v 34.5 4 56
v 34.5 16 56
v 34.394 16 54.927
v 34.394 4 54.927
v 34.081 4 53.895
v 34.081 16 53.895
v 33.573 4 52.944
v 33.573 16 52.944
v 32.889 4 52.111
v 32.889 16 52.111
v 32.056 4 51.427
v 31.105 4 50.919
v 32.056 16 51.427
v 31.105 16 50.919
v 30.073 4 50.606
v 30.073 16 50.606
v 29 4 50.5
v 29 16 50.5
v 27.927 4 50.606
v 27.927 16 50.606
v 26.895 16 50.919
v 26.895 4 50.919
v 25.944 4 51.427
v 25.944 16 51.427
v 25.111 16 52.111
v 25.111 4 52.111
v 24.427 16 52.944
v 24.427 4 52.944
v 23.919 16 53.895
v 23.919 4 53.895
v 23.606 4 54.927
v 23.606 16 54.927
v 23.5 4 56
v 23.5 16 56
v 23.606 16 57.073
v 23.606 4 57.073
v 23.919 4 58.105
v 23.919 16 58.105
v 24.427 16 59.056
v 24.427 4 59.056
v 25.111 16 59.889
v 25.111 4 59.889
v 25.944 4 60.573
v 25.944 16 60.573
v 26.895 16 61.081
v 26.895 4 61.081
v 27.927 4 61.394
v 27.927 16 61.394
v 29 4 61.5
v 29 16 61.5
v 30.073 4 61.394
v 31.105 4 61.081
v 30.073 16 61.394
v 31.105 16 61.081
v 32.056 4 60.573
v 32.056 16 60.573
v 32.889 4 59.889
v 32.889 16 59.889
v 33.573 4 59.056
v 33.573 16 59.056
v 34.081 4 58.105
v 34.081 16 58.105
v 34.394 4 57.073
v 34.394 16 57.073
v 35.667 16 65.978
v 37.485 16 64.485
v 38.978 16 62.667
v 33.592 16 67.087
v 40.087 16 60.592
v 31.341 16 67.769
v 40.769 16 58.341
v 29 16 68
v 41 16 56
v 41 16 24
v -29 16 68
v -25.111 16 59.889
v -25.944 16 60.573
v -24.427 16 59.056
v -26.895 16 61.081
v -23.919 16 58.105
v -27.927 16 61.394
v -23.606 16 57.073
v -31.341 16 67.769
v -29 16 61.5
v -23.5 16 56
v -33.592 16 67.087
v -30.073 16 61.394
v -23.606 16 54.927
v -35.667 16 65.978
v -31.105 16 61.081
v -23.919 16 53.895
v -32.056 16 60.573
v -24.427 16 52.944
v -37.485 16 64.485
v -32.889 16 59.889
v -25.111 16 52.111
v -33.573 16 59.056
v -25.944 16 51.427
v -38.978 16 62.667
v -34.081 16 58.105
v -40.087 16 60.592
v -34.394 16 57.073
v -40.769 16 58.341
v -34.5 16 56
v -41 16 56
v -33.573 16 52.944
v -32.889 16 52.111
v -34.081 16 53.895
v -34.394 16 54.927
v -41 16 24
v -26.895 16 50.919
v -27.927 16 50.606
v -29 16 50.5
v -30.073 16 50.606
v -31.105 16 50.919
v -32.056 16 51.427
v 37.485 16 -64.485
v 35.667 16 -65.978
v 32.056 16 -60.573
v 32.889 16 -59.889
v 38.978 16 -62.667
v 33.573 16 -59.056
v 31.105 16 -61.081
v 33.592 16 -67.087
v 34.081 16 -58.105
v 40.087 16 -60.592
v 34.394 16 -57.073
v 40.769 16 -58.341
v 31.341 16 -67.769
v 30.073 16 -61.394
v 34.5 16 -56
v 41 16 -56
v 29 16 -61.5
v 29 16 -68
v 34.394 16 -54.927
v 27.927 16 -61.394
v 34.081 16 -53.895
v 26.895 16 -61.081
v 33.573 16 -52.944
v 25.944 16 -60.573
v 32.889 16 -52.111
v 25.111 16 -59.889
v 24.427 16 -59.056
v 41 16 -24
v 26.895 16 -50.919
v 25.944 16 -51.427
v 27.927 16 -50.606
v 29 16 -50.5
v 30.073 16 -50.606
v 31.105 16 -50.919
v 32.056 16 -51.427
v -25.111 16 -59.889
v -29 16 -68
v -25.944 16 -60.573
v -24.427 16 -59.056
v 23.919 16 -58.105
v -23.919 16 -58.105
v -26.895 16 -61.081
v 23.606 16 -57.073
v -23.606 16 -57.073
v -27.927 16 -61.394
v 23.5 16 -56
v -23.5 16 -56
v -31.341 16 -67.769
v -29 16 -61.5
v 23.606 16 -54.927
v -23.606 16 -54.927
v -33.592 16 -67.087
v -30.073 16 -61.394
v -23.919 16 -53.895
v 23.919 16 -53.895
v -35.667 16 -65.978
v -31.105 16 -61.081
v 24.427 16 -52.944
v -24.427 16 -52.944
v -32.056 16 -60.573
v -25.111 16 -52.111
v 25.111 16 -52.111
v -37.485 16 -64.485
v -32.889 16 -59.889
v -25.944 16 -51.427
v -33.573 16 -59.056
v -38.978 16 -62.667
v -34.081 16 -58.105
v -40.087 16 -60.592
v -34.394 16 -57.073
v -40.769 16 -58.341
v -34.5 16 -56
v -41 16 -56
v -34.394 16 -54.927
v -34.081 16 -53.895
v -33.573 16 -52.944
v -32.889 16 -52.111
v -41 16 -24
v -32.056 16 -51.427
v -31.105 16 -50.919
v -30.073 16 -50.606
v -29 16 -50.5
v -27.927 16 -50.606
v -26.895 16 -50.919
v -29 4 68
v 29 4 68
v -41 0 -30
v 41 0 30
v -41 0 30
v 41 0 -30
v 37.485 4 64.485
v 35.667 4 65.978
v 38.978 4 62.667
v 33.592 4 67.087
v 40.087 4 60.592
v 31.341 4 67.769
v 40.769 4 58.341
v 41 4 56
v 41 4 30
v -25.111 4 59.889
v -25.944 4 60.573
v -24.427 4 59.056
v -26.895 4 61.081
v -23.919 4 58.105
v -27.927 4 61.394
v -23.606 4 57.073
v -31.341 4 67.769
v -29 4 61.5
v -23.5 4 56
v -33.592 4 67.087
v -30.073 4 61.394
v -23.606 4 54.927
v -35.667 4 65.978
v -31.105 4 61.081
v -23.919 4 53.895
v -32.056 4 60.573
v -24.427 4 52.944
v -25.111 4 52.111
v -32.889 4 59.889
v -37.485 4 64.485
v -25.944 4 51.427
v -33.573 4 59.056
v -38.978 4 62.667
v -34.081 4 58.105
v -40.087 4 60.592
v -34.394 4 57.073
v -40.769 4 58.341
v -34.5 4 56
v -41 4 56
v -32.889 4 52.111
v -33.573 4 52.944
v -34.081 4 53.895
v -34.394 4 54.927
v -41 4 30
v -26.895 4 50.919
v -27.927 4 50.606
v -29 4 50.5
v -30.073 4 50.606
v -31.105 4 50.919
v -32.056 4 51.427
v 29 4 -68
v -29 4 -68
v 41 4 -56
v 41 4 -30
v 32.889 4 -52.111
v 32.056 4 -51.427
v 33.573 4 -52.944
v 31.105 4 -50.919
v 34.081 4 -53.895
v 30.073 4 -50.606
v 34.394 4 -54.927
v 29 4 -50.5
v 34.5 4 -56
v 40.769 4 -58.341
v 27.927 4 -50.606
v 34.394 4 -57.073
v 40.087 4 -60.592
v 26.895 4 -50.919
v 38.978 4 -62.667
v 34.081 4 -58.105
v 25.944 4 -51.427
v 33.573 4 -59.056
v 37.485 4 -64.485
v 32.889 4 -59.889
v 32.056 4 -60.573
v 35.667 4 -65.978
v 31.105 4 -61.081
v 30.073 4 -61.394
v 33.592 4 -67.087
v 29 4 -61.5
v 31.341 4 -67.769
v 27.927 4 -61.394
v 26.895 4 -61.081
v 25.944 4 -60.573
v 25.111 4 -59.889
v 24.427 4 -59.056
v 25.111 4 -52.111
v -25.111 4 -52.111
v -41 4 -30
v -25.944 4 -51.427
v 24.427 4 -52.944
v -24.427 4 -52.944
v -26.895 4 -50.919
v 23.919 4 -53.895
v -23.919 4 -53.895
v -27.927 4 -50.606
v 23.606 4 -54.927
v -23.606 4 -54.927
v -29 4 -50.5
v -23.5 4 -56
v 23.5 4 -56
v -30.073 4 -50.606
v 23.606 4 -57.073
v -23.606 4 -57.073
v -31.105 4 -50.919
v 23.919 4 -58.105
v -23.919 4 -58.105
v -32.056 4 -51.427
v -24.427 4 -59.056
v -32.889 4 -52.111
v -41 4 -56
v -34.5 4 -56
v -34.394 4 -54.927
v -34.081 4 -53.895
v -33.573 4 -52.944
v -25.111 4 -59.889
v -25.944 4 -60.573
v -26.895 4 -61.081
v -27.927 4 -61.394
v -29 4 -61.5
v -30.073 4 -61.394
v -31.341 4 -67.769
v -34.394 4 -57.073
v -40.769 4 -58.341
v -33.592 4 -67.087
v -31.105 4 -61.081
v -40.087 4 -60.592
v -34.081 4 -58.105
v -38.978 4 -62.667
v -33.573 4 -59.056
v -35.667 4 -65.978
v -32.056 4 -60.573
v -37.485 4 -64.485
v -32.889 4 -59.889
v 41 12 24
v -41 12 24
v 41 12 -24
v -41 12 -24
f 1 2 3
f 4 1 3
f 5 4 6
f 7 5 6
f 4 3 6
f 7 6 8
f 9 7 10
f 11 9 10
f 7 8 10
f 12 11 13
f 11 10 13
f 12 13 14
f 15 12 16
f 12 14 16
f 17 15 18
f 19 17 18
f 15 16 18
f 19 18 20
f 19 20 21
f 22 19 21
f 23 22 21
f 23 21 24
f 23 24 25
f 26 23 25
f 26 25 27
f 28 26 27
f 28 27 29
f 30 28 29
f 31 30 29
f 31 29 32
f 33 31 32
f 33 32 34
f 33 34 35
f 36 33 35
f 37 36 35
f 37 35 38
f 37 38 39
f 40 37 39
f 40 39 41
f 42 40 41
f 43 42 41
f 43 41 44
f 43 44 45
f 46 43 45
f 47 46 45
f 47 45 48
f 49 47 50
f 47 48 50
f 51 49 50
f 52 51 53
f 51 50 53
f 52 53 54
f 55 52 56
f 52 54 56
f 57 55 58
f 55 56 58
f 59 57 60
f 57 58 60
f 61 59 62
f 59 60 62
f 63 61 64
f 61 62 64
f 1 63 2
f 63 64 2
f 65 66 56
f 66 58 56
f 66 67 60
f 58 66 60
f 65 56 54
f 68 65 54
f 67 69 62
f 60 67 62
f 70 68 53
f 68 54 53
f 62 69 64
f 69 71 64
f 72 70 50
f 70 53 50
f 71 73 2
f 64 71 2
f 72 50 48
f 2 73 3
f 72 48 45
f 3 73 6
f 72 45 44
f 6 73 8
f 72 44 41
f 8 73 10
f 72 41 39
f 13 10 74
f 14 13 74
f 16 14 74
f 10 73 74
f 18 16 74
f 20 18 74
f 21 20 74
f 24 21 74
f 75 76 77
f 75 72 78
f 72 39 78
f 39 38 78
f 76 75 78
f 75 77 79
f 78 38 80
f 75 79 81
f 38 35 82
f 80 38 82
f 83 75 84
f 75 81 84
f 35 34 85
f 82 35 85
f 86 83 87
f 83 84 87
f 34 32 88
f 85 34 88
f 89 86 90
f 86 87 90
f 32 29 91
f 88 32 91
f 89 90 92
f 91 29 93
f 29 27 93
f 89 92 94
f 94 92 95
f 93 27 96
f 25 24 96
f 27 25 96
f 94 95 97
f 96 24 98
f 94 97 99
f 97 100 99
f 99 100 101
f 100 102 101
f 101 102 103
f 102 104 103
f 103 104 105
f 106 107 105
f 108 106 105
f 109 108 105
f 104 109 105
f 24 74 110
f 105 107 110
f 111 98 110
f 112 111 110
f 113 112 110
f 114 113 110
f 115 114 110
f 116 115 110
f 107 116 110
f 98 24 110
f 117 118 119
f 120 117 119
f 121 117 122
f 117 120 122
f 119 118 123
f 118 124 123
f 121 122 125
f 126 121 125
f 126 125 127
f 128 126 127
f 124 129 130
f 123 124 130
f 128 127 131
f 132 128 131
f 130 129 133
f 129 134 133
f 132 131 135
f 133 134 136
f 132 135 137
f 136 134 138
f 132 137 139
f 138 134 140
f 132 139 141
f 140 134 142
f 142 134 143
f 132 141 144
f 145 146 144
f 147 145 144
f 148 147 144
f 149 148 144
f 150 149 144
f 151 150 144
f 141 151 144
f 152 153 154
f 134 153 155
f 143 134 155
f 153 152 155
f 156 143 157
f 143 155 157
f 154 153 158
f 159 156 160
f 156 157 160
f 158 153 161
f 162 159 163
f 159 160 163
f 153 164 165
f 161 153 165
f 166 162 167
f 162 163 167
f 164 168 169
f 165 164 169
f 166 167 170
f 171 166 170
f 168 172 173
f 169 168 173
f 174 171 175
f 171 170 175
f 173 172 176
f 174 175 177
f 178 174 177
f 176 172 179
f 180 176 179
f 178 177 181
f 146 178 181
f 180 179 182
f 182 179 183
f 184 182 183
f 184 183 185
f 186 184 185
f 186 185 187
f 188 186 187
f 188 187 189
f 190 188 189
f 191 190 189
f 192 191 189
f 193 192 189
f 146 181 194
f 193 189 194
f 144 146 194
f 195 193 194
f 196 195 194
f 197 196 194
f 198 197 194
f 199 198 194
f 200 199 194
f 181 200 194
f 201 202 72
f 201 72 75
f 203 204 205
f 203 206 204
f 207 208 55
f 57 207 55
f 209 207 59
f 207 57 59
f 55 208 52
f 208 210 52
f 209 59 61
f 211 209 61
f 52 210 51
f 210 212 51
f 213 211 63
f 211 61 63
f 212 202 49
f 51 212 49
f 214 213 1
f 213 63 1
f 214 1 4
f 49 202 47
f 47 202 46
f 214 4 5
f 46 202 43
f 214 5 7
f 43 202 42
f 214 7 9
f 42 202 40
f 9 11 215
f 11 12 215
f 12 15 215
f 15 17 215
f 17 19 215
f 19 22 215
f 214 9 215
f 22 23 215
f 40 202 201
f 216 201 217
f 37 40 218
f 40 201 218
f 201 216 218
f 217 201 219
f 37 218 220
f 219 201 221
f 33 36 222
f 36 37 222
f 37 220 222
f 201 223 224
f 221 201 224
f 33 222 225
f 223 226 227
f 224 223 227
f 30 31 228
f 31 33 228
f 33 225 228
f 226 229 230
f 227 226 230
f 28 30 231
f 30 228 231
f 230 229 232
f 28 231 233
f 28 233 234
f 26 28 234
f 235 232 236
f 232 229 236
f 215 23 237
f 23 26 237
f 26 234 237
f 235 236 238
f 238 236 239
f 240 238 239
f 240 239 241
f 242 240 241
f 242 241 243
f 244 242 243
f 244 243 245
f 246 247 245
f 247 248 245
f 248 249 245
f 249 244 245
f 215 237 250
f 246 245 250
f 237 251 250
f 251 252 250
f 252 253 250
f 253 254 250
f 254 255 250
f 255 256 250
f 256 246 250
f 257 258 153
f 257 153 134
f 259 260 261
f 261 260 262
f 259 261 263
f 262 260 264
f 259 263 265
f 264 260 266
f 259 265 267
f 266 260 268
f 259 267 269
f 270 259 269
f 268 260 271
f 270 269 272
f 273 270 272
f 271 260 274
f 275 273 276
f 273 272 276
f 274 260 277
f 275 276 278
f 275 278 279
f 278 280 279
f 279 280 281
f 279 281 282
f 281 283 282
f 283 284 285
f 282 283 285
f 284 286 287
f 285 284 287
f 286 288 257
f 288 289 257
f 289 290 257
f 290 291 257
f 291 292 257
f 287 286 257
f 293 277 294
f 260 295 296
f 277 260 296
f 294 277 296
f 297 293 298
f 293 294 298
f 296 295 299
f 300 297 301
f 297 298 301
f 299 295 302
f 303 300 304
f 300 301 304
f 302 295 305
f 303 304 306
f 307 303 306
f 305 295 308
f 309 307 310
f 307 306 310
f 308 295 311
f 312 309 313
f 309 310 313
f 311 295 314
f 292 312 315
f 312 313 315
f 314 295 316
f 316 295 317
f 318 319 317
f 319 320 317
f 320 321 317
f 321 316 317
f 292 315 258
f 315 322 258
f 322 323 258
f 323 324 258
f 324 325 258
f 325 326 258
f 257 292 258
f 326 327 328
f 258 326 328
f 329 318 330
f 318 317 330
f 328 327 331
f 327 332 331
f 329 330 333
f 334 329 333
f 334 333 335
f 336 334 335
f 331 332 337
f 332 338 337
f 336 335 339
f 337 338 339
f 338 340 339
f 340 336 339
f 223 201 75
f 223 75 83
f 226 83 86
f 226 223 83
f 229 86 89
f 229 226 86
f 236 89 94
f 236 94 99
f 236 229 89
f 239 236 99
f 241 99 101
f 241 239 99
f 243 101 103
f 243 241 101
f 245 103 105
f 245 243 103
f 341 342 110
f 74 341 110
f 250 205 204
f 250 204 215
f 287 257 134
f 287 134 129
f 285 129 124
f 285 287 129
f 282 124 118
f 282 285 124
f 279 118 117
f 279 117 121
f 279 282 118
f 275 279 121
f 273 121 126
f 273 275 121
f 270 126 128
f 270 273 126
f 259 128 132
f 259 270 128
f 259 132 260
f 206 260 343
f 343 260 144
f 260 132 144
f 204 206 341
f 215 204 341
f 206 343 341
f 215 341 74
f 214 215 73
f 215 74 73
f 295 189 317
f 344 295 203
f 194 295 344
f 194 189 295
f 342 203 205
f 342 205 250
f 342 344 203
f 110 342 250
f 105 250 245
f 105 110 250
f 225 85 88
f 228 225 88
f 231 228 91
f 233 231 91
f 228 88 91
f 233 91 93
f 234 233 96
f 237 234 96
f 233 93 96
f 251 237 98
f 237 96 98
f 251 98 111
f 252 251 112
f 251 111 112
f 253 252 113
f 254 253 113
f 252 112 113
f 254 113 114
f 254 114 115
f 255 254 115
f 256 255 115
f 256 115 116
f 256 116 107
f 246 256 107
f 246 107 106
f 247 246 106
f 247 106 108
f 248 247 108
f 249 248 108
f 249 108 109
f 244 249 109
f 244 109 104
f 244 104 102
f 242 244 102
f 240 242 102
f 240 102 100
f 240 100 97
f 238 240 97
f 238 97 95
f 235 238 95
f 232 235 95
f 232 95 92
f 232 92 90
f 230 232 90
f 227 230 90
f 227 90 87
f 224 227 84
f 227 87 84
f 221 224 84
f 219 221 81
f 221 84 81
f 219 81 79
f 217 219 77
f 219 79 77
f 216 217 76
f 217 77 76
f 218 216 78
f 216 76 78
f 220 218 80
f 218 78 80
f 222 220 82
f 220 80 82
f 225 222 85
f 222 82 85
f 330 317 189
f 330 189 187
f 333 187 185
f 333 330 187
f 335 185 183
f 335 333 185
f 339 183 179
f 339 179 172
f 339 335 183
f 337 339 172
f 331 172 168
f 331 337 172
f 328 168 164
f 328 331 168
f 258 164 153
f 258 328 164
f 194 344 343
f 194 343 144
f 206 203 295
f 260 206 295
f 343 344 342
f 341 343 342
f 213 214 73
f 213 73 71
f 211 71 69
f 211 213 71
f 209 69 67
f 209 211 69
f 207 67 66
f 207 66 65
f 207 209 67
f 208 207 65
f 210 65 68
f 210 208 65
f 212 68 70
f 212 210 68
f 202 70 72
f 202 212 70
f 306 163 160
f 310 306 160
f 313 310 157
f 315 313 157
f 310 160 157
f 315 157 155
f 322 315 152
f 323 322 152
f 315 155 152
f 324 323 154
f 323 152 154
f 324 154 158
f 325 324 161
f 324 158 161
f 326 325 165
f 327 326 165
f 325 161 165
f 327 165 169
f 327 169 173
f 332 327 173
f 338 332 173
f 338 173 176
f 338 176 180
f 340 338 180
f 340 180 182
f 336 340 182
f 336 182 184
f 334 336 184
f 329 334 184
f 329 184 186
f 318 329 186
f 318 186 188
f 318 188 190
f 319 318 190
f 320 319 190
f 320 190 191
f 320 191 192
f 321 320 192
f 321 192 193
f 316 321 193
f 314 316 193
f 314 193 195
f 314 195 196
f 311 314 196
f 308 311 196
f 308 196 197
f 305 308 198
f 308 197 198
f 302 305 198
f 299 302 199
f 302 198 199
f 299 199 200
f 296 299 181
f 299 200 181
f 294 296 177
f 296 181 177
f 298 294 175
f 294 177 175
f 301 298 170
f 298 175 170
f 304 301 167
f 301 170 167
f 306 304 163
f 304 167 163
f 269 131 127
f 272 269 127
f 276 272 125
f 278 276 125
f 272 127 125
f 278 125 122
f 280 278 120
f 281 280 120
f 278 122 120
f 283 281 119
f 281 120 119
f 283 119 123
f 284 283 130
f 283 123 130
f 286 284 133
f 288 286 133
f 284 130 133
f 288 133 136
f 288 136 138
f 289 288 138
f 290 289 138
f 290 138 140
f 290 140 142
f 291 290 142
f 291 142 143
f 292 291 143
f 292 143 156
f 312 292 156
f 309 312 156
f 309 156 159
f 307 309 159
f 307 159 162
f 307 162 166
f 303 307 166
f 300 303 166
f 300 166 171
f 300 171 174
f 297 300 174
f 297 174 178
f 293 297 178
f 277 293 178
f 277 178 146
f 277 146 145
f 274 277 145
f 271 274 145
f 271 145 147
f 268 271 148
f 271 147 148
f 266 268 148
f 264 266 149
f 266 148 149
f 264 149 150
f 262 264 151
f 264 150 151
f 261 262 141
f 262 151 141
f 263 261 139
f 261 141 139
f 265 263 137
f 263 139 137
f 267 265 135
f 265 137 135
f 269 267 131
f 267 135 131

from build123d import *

# Parameters (mm, degrees)
SALIENTE_EXTRUIR3_DEPTH = 16
CROQUIS6_R              = 5.5
CORTAR_EXTRUIR3_DEPTH   = 17
CORTAR_EXTRUIR4_DEPTH   = 83
CROQUIS8_W              = 18
CROQUIS8_H              = 4
CROQUIS8_W_2            = 12
CORTAR_EXTRUIR5_DEPTH   = 83
CROQUIS9_W              = 8
CROQUIS9_H              = 4
CORTAR_EXTRUIR6_DEPTH   = 83
CROQUIS10_W             = 7
CROQUIS10_H             = 4
SALIENTE_EXTRUIR4_DEPTH = 82
CROQUIS11_W             = 7
CROQUIS11_H             = 4
SALIENTE_EXTRUIR5_DEPTH = 82


with BuildPart() as part:
    # Croquis1 → Saliente-Extruir3 (new body)
    with BuildSketch(Plane(origin=(0, 0, 0), x_dir=(1, 0, 0), z_dir=(0, 1, 0))):
        with BuildLine():
            Line((-29, 68), (29, 68))
            ThreePointArc((29, 68), (37.485281374, 64.485281374), (41, 56))
            Line((41, 56), (41, -56))
            ThreePointArc((41, -56), (37.485281374, -64.485281374), (29, -68))
            Line((29, -68), (-29, -68))
            ThreePointArc((-29, -68), (-37.485281374, -64.485281374), (-41, -56))
            Line((-41, -56), (-41, 56))
            ThreePointArc((-41, 56), (-37.485281374, 64.485281374), (-29, 68))
        make_face()
    extrude(amount=SALIENTE_EXTRUIR3_DEPTH)

    # Croquis6 → Cortar-Extruir3 (cut, through all)
    with BuildSketch(Plane(origin=(0, 16, 0), x_dir=(1, 0, 0), z_dir=(0, 1, 0))):
        with Locations((-29, 56)):
            Circle(CROQUIS6_R)
        with Locations((29, 56)):
            Circle(CROQUIS6_R)
        with Locations((-29, -56)):
            Circle(CROQUIS6_R)
        with Locations((29, -56)):
            Circle(CROQUIS6_R)
    extrude(amount=-CORTAR_EXTRUIR3_DEPTH, mode=Mode.SUBTRACT)

    # Croquis7 → Cortar-Extruir4 (cut, through all)
    with BuildSketch(Plane.ZY.offset(41)):
        Polygon((0, 16), (-38, 16), (-38, 12), (38, 12), (38, 16), align=None)
    extrude(amount=-CORTAR_EXTRUIR4_DEPTH, mode=Mode.SUBTRACT)

    # Croquis8 → Cortar-Extruir5 (cut, through all)
    with BuildSketch(Plane.ZY.offset(41)):
        with Locations((-47, 2)):
            Rectangle(CROQUIS8_W, CROQUIS8_H)
        with Locations((-62, 2)):
            Rectangle(CROQUIS8_W_2, CROQUIS8_H)
        with Locations((47, 2)):
            Rectangle(CROQUIS8_W, CROQUIS8_H)
        with Locations((62, 2)):
            Rectangle(CROQUIS8_W_2, CROQUIS8_H)
    extrude(amount=-CORTAR_EXTRUIR5_DEPTH, mode=Mode.SUBTRACT)

    # Croquis9 → Cortar-Extruir6 (cut, through all)
    with BuildSketch(Plane.ZY.offset(41)):
        with Locations((34, 2)):
            Rectangle(CROQUIS9_W, CROQUIS9_H)
        with Locations((-34, 2)):
            Rectangle(CROQUIS9_W, CROQUIS9_H)
    extrude(amount=-CORTAR_EXTRUIR6_DEPTH, mode=Mode.SUBTRACT)

    # Croquis10 → Saliente-Extruir4 (add)
    with BuildSketch(Plane.ZY.offset(41)):
        with Locations((-34.5, 14)):
            Rectangle(CROQUIS10_W, CROQUIS10_H)
        with Locations((34.5, 14)):
            Rectangle(CROQUIS10_W, CROQUIS10_H)
    extrude(amount=-SALIENTE_EXTRUIR4_DEPTH)

    # Croquis11 → Saliente-Extruir5 (add)
    with BuildSketch(Plane.ZY.offset(41)):
        with Locations((-27.5, 14)):
            Rectangle(CROQUIS11_W, CROQUIS11_H)
        with Locations((27.5, 14)):
            Rectangle(CROQUIS11_W, CROQUIS11_H)
    extrude(amount=-SALIENTE_EXTRUIR5_DEPTH)


solid = part.part
